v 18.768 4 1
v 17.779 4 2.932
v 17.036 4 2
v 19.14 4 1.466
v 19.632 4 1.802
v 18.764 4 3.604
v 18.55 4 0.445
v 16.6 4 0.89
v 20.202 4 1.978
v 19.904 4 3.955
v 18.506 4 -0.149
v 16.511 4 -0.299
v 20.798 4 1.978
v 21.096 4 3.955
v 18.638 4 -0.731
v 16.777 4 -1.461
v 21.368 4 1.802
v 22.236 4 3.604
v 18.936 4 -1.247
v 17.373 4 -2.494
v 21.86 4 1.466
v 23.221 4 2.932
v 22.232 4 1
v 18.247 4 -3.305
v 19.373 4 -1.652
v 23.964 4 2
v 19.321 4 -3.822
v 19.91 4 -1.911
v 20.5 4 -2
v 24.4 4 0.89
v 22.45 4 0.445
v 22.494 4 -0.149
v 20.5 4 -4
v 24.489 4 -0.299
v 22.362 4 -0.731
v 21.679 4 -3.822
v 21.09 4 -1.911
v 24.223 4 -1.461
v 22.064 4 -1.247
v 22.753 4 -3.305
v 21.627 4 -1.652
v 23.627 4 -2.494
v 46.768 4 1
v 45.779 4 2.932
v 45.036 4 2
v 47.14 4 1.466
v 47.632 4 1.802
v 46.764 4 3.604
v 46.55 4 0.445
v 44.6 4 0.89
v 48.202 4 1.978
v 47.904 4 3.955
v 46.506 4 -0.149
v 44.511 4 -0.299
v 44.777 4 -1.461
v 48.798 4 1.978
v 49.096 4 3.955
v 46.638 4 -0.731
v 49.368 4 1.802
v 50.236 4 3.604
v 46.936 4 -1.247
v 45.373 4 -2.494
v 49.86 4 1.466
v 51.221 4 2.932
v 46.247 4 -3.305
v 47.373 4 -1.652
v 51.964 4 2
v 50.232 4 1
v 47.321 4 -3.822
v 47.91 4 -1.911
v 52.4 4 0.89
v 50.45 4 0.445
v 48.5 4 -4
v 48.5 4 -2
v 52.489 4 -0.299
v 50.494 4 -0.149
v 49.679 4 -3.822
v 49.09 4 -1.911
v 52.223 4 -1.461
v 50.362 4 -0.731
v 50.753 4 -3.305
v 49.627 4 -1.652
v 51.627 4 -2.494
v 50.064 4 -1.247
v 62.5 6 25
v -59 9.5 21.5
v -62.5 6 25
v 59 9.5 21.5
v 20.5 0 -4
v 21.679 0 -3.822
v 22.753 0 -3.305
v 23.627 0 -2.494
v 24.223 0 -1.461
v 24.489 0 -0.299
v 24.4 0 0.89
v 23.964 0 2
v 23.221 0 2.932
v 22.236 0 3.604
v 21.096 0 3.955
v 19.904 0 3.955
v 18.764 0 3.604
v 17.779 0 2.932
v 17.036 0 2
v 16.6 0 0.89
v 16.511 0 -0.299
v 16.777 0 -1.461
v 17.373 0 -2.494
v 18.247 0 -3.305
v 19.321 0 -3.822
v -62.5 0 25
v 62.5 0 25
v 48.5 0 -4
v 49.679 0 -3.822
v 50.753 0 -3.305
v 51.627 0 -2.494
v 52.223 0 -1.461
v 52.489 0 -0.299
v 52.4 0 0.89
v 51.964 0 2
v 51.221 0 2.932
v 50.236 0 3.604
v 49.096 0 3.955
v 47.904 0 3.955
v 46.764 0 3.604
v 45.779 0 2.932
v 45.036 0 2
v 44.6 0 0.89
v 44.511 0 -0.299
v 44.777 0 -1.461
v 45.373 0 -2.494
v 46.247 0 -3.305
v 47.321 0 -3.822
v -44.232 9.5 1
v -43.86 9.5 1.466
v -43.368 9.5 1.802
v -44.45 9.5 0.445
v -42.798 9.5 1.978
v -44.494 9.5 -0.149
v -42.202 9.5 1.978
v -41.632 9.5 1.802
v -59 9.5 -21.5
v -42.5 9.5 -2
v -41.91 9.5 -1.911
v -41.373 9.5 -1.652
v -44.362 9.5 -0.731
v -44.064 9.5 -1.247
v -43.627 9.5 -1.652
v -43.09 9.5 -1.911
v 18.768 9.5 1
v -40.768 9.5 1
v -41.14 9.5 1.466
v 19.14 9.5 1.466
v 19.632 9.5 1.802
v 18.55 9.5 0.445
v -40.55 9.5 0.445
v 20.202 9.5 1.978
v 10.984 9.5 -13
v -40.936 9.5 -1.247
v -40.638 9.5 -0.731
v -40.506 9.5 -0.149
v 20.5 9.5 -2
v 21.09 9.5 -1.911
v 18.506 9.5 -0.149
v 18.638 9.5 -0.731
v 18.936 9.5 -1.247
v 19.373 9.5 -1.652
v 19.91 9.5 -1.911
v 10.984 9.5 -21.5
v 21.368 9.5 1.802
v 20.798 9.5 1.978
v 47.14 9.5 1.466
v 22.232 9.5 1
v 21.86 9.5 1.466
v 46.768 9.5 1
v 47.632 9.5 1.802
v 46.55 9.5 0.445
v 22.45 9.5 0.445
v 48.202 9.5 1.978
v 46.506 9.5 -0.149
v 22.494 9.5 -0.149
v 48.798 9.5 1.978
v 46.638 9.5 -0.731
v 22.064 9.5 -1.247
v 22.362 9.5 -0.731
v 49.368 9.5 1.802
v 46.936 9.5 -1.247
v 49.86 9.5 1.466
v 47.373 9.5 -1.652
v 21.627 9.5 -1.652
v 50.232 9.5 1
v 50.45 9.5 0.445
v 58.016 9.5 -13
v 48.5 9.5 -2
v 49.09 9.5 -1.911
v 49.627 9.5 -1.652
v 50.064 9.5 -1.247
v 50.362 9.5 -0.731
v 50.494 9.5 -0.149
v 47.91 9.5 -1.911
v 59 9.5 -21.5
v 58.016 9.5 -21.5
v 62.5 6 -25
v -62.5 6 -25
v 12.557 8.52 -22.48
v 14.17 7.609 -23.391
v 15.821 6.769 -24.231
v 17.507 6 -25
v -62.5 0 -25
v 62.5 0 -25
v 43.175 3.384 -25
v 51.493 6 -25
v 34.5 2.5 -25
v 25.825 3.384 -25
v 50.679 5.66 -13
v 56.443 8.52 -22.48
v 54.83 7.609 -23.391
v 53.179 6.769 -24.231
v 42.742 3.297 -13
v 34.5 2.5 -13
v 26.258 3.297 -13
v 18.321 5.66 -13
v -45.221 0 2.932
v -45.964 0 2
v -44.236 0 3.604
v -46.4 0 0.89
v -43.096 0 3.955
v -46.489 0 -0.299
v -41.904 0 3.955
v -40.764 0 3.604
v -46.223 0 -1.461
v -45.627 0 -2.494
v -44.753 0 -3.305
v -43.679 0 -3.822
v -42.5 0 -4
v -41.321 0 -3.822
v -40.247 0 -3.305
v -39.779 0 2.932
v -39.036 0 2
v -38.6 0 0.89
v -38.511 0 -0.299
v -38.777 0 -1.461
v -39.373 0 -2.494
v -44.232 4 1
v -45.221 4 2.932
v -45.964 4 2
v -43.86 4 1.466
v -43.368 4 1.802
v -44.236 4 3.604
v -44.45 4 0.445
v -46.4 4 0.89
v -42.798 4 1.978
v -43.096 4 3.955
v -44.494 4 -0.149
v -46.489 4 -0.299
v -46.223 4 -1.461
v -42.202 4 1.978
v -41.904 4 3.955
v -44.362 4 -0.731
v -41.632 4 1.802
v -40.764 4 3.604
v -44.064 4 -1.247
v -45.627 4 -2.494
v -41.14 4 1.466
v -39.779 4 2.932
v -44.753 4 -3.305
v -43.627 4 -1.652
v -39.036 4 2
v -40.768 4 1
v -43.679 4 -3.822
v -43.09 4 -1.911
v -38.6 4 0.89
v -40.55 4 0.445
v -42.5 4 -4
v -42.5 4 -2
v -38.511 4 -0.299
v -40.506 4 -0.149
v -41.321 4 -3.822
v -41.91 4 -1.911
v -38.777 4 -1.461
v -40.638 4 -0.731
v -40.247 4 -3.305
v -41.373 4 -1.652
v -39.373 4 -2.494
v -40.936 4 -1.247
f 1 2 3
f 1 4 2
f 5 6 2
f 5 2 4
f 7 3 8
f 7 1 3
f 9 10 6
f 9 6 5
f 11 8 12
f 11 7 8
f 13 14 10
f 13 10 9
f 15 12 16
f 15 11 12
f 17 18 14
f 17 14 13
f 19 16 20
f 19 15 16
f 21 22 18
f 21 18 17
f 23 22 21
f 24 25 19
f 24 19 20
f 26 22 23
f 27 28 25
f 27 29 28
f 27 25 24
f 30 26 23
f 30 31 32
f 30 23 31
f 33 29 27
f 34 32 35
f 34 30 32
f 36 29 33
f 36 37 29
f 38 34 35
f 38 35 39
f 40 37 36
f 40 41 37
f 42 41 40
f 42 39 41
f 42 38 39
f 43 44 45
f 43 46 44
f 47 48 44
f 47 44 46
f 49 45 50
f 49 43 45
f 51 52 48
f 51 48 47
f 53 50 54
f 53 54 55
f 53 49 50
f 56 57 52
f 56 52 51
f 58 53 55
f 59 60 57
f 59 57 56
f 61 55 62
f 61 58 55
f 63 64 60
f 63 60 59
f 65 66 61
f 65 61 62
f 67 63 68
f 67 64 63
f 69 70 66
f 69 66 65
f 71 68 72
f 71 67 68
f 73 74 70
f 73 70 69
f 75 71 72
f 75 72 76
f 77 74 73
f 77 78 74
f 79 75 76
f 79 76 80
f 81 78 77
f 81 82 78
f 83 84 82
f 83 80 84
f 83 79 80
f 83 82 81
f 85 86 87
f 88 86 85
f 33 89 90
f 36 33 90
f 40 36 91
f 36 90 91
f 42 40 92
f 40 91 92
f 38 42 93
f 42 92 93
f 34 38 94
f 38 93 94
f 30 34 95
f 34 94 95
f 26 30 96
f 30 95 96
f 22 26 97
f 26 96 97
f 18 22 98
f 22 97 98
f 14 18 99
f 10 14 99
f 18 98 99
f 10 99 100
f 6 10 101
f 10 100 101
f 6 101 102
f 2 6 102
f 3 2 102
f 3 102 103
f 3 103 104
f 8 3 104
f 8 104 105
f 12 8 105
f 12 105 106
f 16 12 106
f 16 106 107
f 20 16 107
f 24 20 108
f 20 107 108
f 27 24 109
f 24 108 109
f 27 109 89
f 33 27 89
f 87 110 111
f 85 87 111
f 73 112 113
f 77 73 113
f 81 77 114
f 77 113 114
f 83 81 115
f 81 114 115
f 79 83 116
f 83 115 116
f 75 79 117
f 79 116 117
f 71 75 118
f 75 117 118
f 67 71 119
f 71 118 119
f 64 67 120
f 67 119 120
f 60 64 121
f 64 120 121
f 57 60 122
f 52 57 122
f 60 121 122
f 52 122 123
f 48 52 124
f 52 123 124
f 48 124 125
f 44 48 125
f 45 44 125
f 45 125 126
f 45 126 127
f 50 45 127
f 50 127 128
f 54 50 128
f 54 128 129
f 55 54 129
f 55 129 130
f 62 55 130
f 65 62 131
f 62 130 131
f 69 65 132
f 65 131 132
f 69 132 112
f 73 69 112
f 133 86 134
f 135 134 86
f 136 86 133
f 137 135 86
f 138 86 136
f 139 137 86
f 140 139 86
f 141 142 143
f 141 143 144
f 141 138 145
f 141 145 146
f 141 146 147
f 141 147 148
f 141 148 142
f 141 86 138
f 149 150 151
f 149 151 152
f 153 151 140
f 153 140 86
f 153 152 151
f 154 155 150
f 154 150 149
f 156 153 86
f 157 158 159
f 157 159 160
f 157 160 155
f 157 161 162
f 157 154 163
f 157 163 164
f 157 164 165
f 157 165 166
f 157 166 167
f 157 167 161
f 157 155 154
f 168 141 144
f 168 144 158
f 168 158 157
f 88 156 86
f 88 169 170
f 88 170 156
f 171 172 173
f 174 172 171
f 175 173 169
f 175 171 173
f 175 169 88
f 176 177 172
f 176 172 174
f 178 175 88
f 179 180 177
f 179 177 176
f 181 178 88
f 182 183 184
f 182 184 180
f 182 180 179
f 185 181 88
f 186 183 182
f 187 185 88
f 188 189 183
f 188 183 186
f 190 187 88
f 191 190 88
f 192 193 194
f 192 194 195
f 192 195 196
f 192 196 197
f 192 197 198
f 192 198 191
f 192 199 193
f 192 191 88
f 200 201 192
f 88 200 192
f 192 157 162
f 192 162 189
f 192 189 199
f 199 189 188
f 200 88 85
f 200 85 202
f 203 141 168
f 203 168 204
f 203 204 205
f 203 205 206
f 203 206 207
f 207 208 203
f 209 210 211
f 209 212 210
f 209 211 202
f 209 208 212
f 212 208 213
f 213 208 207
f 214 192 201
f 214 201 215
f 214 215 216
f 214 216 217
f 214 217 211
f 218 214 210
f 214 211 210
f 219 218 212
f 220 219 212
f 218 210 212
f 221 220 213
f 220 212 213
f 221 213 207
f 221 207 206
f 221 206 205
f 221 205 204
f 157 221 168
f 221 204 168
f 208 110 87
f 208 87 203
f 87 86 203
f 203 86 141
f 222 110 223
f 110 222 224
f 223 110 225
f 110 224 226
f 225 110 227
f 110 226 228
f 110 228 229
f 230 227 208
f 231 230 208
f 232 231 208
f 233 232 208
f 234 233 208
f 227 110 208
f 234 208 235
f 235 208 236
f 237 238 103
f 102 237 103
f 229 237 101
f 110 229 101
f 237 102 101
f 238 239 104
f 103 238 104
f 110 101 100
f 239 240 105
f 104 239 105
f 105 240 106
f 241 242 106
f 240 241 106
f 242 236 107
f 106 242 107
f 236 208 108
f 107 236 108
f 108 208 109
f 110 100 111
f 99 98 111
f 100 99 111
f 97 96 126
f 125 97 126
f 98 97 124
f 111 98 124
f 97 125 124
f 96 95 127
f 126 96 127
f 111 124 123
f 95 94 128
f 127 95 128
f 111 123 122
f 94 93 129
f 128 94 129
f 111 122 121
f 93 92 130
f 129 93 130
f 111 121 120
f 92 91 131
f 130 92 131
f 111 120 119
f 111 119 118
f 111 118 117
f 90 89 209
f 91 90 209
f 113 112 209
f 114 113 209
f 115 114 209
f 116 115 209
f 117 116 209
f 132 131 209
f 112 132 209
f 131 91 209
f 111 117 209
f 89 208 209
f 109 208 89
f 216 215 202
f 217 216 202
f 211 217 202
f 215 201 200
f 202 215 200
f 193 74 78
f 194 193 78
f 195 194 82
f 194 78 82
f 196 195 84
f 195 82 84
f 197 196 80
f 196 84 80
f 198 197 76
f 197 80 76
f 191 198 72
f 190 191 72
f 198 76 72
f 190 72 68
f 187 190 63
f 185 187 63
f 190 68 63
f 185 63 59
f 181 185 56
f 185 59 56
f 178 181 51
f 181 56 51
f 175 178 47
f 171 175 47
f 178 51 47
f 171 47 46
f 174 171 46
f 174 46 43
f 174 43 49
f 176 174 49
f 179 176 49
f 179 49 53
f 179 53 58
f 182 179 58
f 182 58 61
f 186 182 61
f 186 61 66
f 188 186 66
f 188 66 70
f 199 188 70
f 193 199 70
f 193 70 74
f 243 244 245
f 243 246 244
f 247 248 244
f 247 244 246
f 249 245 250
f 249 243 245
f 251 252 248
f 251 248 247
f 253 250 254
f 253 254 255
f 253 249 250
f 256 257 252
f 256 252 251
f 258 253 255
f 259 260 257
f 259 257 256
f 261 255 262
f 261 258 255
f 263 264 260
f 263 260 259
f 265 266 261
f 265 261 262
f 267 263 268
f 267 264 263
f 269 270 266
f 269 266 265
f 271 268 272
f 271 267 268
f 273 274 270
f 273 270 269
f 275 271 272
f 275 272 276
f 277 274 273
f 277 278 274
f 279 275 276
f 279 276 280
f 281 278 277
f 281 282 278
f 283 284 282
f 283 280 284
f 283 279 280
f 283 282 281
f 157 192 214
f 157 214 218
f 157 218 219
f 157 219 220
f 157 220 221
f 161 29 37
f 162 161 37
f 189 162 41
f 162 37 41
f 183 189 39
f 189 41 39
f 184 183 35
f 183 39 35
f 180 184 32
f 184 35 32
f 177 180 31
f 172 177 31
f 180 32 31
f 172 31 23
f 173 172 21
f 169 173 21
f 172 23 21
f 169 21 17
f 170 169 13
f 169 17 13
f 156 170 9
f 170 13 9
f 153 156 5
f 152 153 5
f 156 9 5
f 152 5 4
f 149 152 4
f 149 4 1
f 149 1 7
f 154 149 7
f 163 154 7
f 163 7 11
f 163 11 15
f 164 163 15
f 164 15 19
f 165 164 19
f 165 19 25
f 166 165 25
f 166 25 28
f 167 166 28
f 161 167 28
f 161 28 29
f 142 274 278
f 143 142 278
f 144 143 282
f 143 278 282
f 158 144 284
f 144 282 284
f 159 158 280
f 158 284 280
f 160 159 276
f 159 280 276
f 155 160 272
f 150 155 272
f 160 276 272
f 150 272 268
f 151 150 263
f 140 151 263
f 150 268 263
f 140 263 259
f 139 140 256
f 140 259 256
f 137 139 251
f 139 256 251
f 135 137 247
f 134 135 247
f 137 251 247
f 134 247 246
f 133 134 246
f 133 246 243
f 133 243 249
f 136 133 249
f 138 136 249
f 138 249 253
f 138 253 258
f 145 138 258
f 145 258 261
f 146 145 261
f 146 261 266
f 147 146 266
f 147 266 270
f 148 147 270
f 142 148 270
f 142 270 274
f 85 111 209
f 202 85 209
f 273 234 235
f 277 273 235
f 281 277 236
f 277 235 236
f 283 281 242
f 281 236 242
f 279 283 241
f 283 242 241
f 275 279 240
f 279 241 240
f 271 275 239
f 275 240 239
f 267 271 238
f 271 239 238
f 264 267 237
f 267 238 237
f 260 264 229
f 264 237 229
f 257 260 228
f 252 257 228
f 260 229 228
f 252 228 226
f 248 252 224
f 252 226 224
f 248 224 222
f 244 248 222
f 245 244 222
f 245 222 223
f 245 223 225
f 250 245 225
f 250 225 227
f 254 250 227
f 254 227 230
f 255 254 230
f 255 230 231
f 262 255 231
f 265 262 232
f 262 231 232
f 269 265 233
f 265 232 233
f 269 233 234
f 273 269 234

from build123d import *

# Parameters (mm, degrees)
SKETCH1_W           = 125
SKETCH1_H           = 50
BOSS_EXTRUDE1_DEPTH = 9.5
CHAMFER1_SIZE       = 3.5
SKETCH3_R           = 4
CUT_EXTRUDE2_DEPTH  = 4
SKETCH4_R           = 2
CUT_EXTRUDE3_DEPTH  = 68.538877693
SKETCH6_R           = 43
CUT_EXTRUDE4_DEPTH  = 12


with BuildPart() as part:
    # Sketch1 → Boss-Extrude1 (new body)
    with BuildSketch(Plane(origin=(0, 0, 0), x_dir=(1, 0, 0), z_dir=(0, 1, 0))):
        Rectangle(SKETCH1_W, SKETCH1_H)
    extrude(amount=BOSS_EXTRUDE1_DEPTH)

    # Chamfer1
    chamfer1_edges = [part.edges().sort_by_distance(p)[0] for p in [
        (-62.5, 9.5, 0),
        (0, 9.5, 25),
        (62.5, 9.5, 0),
        (0, 9.5, -25),
    ]]
    chamfer(chamfer1_edges, length=CHAMFER1_SIZE)

    # Sketch3 → Cut-Extrude2 (cut)
    with BuildSketch(Plane.XZ):
        with Locations(Location((-42.5, 0, 0), (0, 0, 270))):
            Circle(SKETCH3_R)
        with Locations(Location((20.5, 0, 0), (0, 0, 270))):
            Circle(SKETCH3_R)
        with Locations(Location((48.5, 0, 0), (0, 0, 270))):
            Circle(SKETCH3_R)
    extrude(amount=-CUT_EXTRUDE2_DEPTH, mode=Mode.SUBTRACT)

    # Sketch4 → Cut-Extrude3 (cut, through all)
    with BuildSketch(Plane.XZ.offset(-4)):
        with Locations(Location((-42.5, 0, 0), (0, 0, 270))):
            Circle(SKETCH4_R)
        with Locations(Location((20.5, 0, 0), (0, 0, 270))):
            Circle(SKETCH4_R)
        with Locations(Location((48.5, 0, 0), (0, 0, 270))):
            Circle(SKETCH4_R)
    extrude(amount=-CUT_EXTRUDE3_DEPTH, mode=Mode.SUBTRACT)

    # Sketch6 → Cut-Extrude4 (cut)
    with BuildSketch(Plane(origin=(0, 0, -25), x_dir=(-1, 0, 0), z_dir=(0, 0, -1))):
        with Locations((-34.5, 45.5)):
            Circle(SKETCH6_R)
    extrude(amount=-CUT_EXTRUDE4_DEPTH, mode=Mode.SUBTRACT)


solid = part.part
